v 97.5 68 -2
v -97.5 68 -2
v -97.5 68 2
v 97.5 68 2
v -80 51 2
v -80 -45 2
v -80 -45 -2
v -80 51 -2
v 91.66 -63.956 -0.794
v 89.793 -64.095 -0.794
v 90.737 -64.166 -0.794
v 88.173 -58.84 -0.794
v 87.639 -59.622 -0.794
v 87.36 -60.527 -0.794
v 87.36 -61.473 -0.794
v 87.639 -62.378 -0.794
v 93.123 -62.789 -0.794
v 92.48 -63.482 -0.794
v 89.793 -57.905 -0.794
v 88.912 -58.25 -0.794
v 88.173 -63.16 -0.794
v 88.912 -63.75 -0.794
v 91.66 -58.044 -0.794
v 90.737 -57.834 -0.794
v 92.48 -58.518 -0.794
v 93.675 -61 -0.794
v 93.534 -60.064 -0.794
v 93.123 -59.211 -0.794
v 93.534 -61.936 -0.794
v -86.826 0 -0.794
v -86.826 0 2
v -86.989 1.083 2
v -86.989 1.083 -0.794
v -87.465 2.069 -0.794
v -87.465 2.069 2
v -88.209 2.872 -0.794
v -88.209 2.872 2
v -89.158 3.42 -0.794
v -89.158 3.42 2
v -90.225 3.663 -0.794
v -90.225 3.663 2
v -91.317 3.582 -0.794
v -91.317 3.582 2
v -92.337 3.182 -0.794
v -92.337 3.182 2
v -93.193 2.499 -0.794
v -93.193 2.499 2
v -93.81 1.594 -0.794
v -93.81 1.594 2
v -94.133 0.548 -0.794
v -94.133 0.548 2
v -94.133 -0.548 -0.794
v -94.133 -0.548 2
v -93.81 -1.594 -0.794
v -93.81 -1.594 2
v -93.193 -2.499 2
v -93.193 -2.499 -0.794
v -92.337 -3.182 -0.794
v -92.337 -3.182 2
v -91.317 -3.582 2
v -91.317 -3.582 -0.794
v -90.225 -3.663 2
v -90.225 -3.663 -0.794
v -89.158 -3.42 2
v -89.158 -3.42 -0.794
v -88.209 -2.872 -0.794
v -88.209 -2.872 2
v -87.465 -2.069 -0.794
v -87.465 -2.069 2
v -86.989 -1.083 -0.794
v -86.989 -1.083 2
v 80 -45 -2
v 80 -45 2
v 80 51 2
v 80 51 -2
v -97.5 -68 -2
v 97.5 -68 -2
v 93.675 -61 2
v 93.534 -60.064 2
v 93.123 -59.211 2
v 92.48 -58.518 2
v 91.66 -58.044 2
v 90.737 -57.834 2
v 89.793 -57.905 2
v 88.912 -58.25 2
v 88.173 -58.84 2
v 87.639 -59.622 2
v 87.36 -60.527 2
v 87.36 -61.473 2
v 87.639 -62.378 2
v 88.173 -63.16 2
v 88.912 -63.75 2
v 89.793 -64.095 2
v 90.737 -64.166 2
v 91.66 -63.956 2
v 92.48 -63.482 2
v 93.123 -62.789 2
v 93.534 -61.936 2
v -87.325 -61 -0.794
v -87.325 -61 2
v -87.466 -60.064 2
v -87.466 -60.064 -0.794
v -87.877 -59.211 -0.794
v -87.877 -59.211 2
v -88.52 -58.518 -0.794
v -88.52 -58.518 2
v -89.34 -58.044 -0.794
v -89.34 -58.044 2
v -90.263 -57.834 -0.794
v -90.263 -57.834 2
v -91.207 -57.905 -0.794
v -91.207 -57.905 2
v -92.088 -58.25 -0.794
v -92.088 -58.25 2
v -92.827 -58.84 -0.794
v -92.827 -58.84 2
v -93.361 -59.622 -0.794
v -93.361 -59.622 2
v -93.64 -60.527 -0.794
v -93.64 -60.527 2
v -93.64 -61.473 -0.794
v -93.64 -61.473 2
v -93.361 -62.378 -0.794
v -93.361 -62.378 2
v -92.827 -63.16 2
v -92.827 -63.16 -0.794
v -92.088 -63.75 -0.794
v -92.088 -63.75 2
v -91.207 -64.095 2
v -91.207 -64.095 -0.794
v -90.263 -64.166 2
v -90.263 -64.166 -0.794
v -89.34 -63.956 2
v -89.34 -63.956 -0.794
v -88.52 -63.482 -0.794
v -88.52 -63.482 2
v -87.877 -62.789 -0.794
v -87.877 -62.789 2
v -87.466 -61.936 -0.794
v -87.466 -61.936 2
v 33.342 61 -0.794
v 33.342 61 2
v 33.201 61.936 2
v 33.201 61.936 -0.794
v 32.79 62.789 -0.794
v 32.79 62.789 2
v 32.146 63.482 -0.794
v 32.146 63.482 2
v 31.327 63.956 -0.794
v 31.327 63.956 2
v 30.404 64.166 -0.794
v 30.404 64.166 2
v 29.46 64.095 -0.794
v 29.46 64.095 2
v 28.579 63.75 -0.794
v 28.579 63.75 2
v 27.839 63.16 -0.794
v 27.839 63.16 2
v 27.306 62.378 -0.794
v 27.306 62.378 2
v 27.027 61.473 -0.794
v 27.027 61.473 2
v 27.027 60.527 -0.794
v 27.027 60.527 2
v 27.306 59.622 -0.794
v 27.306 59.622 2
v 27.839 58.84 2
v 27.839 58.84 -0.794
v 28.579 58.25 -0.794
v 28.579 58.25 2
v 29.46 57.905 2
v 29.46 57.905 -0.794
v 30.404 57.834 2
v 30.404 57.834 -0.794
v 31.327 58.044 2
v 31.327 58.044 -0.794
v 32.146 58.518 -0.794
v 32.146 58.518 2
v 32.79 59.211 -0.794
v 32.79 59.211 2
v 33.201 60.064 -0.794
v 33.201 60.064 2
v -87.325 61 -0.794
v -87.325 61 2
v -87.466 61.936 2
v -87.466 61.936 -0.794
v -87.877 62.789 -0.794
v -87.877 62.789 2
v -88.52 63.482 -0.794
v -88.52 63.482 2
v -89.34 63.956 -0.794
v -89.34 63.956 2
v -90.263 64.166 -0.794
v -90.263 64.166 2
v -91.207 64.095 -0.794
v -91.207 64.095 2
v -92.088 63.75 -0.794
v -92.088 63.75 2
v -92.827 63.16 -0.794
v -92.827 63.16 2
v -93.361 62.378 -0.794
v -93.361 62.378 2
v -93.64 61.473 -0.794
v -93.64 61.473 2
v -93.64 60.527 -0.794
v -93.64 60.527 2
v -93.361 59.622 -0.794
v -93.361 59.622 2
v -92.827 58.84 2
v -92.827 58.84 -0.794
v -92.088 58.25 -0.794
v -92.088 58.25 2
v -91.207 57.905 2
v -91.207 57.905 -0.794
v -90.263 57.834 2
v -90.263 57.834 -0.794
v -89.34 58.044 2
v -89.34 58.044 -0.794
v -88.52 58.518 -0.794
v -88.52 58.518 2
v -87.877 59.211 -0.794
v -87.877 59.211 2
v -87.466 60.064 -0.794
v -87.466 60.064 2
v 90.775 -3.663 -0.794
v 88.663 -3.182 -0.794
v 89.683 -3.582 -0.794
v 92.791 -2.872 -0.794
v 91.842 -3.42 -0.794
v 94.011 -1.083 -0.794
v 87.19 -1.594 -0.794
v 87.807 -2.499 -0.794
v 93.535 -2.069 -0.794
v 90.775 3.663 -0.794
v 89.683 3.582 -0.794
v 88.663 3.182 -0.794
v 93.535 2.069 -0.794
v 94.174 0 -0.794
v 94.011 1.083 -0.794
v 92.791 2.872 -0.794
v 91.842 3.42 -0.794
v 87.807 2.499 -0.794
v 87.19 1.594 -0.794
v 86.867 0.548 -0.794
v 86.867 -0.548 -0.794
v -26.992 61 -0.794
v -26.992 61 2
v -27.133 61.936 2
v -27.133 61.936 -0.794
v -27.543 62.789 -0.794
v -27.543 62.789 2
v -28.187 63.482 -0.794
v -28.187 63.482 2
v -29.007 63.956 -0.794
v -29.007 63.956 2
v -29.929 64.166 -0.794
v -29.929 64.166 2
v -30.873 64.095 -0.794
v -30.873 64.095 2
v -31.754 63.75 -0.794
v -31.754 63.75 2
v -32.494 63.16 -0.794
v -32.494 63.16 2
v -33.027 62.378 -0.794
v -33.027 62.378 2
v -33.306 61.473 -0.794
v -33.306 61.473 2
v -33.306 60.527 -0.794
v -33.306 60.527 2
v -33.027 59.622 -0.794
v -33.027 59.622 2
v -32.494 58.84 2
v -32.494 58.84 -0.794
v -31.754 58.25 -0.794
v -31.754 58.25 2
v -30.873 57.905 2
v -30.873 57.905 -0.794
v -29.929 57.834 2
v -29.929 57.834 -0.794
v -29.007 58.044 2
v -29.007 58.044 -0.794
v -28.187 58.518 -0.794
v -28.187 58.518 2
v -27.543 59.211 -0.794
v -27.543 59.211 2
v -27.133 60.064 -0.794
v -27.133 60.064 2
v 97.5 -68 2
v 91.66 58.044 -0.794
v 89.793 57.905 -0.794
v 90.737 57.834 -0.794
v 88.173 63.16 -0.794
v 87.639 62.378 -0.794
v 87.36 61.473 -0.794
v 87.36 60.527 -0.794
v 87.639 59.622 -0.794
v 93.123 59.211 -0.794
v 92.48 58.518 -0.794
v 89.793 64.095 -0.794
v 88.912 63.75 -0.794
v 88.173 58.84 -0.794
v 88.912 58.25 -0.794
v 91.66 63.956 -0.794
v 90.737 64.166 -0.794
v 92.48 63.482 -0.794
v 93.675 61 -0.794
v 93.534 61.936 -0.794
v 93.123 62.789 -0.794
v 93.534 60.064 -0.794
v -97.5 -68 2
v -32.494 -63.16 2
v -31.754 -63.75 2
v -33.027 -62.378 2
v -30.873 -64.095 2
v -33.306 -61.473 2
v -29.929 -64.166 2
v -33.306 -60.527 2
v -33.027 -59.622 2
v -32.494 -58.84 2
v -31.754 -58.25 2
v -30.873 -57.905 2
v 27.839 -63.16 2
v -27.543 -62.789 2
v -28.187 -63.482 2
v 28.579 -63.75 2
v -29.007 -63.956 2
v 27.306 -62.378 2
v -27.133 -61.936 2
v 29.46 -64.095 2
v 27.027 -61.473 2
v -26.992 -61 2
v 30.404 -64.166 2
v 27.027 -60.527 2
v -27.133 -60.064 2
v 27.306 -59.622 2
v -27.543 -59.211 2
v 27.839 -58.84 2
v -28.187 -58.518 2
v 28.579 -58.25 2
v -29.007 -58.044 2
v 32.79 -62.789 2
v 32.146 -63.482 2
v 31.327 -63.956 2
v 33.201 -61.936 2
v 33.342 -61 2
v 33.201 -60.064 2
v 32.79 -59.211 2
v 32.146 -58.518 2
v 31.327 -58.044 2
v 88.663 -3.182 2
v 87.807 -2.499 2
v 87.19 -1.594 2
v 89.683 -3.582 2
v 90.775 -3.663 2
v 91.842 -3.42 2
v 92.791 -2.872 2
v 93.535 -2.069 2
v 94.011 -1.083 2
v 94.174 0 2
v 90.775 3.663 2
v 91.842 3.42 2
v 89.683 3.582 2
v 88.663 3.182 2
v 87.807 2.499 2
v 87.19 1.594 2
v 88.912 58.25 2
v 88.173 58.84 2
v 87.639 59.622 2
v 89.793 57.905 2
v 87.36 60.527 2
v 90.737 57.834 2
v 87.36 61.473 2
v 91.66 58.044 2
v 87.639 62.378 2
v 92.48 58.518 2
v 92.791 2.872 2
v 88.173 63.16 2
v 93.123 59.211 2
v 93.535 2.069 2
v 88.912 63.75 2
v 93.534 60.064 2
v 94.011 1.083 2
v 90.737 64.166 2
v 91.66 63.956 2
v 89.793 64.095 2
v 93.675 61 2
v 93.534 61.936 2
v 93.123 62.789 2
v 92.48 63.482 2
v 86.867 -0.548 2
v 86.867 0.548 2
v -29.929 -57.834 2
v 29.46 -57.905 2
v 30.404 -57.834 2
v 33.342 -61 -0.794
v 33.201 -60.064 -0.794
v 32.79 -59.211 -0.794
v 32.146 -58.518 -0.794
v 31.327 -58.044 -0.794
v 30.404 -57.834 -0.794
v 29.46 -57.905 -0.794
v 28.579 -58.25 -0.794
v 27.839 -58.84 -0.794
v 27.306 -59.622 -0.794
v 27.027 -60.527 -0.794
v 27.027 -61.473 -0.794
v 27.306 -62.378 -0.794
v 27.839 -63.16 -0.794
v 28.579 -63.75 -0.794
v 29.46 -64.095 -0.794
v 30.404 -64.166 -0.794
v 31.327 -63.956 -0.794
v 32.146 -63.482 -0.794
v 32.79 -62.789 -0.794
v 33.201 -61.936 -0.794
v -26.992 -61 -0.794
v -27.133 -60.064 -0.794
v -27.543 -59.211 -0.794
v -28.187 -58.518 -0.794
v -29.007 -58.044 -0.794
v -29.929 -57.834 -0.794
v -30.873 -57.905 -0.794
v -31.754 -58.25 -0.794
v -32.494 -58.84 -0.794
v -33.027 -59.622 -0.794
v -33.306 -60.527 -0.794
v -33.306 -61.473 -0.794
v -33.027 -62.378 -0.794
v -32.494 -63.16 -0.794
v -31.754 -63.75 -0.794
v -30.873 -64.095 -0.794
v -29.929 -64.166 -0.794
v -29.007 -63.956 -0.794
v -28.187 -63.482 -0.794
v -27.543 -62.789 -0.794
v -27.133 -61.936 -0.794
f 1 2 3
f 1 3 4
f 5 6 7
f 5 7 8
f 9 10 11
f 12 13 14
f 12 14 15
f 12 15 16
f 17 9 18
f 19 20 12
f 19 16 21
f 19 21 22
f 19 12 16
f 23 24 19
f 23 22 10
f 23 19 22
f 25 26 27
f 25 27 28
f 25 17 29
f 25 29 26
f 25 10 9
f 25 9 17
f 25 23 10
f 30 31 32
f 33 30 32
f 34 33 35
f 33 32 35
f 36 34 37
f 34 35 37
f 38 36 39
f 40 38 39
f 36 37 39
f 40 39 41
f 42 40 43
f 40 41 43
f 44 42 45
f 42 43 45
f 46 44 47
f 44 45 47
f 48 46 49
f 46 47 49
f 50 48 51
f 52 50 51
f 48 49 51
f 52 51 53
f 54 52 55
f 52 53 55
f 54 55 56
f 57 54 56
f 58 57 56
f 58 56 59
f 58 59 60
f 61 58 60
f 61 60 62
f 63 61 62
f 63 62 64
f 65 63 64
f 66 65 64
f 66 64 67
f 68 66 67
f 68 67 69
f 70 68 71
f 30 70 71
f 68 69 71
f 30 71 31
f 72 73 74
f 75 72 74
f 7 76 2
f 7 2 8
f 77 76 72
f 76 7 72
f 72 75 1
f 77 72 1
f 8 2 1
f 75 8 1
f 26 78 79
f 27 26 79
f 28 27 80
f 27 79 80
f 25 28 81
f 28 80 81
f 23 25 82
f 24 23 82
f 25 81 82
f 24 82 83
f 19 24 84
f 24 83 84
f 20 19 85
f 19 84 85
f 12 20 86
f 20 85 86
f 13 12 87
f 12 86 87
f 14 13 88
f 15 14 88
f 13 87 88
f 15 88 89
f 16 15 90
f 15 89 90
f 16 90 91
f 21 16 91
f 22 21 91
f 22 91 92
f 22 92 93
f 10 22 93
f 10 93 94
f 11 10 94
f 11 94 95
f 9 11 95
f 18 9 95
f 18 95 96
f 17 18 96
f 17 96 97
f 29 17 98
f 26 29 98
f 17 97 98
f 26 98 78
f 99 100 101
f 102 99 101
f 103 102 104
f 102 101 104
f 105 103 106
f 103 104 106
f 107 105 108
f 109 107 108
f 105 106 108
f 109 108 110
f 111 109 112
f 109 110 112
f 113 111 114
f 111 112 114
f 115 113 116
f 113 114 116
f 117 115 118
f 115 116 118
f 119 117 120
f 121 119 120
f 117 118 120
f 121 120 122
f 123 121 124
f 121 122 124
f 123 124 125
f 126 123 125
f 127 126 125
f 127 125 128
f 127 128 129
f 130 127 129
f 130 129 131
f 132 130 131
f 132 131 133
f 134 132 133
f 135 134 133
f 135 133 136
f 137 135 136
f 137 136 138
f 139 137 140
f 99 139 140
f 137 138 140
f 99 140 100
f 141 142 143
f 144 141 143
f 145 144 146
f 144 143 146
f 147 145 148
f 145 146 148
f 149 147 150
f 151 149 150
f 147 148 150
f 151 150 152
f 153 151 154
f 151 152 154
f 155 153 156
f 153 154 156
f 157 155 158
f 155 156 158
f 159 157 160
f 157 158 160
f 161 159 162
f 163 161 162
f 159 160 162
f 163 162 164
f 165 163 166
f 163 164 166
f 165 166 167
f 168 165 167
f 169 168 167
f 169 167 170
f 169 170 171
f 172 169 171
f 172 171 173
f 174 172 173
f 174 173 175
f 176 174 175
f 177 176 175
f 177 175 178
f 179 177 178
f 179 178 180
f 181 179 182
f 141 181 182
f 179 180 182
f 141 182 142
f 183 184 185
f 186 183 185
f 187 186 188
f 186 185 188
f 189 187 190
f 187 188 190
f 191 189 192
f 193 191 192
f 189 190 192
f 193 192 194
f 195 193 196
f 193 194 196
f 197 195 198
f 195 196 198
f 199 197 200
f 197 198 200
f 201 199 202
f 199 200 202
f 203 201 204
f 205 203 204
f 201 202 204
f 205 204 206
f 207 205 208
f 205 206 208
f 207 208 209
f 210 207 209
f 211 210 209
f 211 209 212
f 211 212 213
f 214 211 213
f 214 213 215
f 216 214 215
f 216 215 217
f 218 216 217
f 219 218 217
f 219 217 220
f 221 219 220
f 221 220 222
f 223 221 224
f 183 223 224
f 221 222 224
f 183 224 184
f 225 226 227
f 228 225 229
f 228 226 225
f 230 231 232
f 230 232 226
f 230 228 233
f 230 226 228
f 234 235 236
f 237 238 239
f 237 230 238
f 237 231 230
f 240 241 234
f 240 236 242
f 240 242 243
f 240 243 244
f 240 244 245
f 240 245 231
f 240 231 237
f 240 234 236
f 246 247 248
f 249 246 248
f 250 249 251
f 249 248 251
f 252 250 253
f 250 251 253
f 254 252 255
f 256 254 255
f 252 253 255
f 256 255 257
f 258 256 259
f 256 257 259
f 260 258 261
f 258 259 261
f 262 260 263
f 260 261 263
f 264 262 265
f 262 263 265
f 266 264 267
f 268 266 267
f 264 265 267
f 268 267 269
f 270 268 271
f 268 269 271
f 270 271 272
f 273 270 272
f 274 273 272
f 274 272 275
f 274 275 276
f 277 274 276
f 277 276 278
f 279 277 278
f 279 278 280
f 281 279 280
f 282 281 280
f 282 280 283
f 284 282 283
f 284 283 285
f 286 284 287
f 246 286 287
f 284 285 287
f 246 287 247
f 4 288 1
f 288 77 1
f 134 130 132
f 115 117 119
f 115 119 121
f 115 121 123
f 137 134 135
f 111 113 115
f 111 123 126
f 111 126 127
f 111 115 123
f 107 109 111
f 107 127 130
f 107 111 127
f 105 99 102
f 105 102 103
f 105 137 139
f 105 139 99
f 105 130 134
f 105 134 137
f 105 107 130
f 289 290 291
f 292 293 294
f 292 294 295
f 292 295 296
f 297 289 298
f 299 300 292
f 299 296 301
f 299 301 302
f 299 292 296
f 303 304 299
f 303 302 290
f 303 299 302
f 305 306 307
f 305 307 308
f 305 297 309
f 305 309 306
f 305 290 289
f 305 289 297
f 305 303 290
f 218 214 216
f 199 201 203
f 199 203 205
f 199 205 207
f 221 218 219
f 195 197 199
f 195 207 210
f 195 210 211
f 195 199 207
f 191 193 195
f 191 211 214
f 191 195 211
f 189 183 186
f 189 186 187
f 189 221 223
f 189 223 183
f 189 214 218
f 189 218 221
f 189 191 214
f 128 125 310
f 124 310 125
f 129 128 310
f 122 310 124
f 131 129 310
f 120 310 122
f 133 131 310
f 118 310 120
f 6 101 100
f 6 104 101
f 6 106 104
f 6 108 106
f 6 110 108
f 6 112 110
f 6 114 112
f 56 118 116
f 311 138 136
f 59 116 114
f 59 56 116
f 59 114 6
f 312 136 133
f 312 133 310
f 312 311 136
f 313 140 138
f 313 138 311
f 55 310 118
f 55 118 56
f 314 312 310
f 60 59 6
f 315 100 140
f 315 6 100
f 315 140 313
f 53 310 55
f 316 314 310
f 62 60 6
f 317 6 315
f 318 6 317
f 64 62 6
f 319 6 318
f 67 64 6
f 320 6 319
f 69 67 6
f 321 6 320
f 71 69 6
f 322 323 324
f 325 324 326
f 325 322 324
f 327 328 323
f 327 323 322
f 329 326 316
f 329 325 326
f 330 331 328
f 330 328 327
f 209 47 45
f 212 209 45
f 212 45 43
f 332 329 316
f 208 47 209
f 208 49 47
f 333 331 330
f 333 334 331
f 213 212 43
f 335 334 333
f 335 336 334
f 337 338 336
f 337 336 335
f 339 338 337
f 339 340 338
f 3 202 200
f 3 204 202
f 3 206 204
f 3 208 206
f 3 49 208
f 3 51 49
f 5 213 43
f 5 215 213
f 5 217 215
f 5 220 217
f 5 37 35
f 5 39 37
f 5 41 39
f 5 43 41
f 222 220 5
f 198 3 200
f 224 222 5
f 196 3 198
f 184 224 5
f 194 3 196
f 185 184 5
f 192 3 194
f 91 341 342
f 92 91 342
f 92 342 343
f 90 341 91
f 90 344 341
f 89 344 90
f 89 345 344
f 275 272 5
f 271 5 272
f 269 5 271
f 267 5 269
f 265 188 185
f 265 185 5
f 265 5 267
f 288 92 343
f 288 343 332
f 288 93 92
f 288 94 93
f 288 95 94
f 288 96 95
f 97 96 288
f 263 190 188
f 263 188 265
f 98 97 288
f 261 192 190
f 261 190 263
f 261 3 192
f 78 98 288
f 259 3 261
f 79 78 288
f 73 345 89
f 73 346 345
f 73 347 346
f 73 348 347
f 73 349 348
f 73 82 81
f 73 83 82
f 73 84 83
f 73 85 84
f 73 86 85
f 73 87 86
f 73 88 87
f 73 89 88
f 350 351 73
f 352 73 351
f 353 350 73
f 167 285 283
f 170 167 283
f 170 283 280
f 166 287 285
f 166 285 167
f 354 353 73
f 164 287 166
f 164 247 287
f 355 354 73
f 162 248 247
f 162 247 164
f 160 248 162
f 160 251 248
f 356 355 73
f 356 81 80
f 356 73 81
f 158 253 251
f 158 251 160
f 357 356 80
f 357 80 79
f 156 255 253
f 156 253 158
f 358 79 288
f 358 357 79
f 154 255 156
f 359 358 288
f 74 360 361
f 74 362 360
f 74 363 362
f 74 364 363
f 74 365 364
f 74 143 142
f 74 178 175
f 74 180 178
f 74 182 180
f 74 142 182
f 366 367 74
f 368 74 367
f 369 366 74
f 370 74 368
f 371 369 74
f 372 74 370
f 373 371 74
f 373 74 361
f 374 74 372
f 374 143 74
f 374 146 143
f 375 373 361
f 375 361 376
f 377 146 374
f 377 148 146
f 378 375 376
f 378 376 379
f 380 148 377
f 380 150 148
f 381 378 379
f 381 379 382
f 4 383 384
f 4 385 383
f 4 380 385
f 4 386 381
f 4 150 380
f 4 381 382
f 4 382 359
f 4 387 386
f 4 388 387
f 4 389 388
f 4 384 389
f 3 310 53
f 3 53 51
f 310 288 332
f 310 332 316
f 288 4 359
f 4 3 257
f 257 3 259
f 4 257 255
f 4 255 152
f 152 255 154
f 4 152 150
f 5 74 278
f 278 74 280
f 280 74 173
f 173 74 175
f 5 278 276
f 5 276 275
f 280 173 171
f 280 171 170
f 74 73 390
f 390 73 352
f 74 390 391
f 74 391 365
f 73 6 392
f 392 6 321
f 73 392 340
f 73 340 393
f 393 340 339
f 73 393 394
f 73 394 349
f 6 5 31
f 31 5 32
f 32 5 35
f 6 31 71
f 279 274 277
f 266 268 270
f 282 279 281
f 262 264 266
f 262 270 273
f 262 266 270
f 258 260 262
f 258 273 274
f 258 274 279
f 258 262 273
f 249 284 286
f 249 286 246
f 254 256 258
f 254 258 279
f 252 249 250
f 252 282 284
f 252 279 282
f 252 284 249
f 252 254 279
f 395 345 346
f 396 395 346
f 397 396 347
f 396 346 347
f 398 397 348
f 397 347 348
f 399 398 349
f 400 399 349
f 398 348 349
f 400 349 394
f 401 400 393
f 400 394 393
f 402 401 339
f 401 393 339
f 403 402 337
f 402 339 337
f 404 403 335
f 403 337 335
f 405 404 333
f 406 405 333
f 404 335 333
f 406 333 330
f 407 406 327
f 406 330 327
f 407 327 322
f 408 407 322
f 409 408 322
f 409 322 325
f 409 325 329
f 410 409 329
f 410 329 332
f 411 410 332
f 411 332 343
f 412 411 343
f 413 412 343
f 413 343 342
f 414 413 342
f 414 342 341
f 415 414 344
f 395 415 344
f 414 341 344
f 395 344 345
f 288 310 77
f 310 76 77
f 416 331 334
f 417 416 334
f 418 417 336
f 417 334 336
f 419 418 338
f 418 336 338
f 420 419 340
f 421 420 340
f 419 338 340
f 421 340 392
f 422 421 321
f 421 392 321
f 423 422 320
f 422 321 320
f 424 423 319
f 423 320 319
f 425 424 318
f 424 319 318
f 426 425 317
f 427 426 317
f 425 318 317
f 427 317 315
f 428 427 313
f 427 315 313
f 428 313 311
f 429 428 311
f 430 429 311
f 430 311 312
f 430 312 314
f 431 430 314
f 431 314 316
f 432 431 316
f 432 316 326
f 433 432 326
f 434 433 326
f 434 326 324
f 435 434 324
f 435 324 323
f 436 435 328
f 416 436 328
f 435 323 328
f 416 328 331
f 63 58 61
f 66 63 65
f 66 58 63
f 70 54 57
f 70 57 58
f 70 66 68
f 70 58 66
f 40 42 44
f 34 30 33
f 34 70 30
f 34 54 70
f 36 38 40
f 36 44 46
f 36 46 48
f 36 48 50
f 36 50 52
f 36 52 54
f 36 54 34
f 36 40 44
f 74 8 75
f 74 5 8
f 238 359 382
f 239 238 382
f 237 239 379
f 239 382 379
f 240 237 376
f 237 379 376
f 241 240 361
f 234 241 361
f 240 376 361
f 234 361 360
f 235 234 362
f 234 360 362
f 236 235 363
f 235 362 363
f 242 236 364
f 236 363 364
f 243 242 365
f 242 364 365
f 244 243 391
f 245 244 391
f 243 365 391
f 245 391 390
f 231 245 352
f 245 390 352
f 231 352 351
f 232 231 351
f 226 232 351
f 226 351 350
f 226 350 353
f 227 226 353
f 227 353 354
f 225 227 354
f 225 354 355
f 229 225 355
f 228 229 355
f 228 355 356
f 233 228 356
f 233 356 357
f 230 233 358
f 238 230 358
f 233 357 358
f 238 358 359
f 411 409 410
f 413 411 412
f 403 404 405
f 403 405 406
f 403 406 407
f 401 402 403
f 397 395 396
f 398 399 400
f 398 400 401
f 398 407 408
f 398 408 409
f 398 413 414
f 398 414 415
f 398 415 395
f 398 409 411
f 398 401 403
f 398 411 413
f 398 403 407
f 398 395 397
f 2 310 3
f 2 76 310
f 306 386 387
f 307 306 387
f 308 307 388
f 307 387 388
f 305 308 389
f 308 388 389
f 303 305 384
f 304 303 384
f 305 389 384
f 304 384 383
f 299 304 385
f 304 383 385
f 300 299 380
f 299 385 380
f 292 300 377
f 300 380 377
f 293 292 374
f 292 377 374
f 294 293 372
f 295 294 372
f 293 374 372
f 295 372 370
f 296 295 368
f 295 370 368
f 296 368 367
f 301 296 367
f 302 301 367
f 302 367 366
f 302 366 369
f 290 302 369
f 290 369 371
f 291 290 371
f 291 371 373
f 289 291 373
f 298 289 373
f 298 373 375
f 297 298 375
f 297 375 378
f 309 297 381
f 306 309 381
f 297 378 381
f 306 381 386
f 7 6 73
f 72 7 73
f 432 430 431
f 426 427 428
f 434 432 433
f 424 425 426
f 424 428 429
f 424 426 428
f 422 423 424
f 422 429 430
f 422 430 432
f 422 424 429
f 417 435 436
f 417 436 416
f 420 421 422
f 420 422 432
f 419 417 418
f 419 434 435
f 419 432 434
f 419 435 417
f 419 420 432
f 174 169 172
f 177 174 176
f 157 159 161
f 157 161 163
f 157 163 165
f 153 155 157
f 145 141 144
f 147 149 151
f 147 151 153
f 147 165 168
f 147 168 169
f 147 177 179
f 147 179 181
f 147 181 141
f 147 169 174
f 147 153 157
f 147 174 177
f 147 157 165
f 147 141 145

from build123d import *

# Parameters (mm, degrees)
SKETCH1_W           = 195
SKETCH1_H           = 136
SKETCH1_W_2         = 160
SKETCH1_H_2         = 96
BOSS_EXTRUDE1_DEPTH = 2
SKETCH1_3_W         = 195
SKETCH1_3_H         = 136
SKETCH1_3_W_2       = 160
SKETCH1_3_H_2       = 96
BOSS_EXTRUDE2_DEPTH = 2
SKETCH2_R           = 3.175
SKETCH2_R_2         = 3.673722566
CUT_EXTRUDE1_DEPTH  = 2.794


with BuildPart() as part:
    # Sketch1 → Boss-Extrude1 (new body)
    with BuildSketch(Plane.XY):
        Rectangle(SKETCH1_W, SKETCH1_H)
        with Locations((0, 3)):
            Rectangle(SKETCH1_W_2, SKETCH1_H_2, mode=Mode.SUBTRACT)
    extrude(amount=-BOSS_EXTRUDE1_DEPTH)

    # Sketch1<3> → Boss-Extrude2 (add)
    with BuildSketch(Plane.XY):
        Rectangle(SKETCH1_3_W, SKETCH1_3_H)
        with Locations((0, 3)):
            Rectangle(SKETCH1_3_W_2, SKETCH1_3_H_2, mode=Mode.SUBTRACT)
    extrude(amount=BOSS_EXTRUDE2_DEPTH)

    # Sketch2 → Cut-Extrude1 (cut)
    with BuildSketch(Plane.XY.offset(2)):
        with Locations((-90.5, 61)):
            Circle(SKETCH2_R)
        with Locations((90.5, 61)):
            Circle(SKETCH2_R)
        with Locations((90.5, -61)):
            Circle(SKETCH2_R)
        with Locations((-90.5, -61)):
            Circle(SKETCH2_R)
        with Locations((-30.166666667, -61)):
            Circle(SKETCH2_R)
        with Locations((30.166666667, -61)):
            Circle(SKETCH2_R)
        with Locations((90.5, 0)):
            Circle(SKETCH2_R_2)
        with Locations((-30.166666667, 61)):
            Circle(SKETCH2_R)
        with Locations((30.166666667, 61)):
            Circle(SKETCH2_R)
        with Locations((-90.5, 0)):
            Circle(SKETCH2_R_2)
    extrude(amount=-CUT_EXTRUDE1_DEPTH, mode=Mode.SUBTRACT)


solid = part.part
